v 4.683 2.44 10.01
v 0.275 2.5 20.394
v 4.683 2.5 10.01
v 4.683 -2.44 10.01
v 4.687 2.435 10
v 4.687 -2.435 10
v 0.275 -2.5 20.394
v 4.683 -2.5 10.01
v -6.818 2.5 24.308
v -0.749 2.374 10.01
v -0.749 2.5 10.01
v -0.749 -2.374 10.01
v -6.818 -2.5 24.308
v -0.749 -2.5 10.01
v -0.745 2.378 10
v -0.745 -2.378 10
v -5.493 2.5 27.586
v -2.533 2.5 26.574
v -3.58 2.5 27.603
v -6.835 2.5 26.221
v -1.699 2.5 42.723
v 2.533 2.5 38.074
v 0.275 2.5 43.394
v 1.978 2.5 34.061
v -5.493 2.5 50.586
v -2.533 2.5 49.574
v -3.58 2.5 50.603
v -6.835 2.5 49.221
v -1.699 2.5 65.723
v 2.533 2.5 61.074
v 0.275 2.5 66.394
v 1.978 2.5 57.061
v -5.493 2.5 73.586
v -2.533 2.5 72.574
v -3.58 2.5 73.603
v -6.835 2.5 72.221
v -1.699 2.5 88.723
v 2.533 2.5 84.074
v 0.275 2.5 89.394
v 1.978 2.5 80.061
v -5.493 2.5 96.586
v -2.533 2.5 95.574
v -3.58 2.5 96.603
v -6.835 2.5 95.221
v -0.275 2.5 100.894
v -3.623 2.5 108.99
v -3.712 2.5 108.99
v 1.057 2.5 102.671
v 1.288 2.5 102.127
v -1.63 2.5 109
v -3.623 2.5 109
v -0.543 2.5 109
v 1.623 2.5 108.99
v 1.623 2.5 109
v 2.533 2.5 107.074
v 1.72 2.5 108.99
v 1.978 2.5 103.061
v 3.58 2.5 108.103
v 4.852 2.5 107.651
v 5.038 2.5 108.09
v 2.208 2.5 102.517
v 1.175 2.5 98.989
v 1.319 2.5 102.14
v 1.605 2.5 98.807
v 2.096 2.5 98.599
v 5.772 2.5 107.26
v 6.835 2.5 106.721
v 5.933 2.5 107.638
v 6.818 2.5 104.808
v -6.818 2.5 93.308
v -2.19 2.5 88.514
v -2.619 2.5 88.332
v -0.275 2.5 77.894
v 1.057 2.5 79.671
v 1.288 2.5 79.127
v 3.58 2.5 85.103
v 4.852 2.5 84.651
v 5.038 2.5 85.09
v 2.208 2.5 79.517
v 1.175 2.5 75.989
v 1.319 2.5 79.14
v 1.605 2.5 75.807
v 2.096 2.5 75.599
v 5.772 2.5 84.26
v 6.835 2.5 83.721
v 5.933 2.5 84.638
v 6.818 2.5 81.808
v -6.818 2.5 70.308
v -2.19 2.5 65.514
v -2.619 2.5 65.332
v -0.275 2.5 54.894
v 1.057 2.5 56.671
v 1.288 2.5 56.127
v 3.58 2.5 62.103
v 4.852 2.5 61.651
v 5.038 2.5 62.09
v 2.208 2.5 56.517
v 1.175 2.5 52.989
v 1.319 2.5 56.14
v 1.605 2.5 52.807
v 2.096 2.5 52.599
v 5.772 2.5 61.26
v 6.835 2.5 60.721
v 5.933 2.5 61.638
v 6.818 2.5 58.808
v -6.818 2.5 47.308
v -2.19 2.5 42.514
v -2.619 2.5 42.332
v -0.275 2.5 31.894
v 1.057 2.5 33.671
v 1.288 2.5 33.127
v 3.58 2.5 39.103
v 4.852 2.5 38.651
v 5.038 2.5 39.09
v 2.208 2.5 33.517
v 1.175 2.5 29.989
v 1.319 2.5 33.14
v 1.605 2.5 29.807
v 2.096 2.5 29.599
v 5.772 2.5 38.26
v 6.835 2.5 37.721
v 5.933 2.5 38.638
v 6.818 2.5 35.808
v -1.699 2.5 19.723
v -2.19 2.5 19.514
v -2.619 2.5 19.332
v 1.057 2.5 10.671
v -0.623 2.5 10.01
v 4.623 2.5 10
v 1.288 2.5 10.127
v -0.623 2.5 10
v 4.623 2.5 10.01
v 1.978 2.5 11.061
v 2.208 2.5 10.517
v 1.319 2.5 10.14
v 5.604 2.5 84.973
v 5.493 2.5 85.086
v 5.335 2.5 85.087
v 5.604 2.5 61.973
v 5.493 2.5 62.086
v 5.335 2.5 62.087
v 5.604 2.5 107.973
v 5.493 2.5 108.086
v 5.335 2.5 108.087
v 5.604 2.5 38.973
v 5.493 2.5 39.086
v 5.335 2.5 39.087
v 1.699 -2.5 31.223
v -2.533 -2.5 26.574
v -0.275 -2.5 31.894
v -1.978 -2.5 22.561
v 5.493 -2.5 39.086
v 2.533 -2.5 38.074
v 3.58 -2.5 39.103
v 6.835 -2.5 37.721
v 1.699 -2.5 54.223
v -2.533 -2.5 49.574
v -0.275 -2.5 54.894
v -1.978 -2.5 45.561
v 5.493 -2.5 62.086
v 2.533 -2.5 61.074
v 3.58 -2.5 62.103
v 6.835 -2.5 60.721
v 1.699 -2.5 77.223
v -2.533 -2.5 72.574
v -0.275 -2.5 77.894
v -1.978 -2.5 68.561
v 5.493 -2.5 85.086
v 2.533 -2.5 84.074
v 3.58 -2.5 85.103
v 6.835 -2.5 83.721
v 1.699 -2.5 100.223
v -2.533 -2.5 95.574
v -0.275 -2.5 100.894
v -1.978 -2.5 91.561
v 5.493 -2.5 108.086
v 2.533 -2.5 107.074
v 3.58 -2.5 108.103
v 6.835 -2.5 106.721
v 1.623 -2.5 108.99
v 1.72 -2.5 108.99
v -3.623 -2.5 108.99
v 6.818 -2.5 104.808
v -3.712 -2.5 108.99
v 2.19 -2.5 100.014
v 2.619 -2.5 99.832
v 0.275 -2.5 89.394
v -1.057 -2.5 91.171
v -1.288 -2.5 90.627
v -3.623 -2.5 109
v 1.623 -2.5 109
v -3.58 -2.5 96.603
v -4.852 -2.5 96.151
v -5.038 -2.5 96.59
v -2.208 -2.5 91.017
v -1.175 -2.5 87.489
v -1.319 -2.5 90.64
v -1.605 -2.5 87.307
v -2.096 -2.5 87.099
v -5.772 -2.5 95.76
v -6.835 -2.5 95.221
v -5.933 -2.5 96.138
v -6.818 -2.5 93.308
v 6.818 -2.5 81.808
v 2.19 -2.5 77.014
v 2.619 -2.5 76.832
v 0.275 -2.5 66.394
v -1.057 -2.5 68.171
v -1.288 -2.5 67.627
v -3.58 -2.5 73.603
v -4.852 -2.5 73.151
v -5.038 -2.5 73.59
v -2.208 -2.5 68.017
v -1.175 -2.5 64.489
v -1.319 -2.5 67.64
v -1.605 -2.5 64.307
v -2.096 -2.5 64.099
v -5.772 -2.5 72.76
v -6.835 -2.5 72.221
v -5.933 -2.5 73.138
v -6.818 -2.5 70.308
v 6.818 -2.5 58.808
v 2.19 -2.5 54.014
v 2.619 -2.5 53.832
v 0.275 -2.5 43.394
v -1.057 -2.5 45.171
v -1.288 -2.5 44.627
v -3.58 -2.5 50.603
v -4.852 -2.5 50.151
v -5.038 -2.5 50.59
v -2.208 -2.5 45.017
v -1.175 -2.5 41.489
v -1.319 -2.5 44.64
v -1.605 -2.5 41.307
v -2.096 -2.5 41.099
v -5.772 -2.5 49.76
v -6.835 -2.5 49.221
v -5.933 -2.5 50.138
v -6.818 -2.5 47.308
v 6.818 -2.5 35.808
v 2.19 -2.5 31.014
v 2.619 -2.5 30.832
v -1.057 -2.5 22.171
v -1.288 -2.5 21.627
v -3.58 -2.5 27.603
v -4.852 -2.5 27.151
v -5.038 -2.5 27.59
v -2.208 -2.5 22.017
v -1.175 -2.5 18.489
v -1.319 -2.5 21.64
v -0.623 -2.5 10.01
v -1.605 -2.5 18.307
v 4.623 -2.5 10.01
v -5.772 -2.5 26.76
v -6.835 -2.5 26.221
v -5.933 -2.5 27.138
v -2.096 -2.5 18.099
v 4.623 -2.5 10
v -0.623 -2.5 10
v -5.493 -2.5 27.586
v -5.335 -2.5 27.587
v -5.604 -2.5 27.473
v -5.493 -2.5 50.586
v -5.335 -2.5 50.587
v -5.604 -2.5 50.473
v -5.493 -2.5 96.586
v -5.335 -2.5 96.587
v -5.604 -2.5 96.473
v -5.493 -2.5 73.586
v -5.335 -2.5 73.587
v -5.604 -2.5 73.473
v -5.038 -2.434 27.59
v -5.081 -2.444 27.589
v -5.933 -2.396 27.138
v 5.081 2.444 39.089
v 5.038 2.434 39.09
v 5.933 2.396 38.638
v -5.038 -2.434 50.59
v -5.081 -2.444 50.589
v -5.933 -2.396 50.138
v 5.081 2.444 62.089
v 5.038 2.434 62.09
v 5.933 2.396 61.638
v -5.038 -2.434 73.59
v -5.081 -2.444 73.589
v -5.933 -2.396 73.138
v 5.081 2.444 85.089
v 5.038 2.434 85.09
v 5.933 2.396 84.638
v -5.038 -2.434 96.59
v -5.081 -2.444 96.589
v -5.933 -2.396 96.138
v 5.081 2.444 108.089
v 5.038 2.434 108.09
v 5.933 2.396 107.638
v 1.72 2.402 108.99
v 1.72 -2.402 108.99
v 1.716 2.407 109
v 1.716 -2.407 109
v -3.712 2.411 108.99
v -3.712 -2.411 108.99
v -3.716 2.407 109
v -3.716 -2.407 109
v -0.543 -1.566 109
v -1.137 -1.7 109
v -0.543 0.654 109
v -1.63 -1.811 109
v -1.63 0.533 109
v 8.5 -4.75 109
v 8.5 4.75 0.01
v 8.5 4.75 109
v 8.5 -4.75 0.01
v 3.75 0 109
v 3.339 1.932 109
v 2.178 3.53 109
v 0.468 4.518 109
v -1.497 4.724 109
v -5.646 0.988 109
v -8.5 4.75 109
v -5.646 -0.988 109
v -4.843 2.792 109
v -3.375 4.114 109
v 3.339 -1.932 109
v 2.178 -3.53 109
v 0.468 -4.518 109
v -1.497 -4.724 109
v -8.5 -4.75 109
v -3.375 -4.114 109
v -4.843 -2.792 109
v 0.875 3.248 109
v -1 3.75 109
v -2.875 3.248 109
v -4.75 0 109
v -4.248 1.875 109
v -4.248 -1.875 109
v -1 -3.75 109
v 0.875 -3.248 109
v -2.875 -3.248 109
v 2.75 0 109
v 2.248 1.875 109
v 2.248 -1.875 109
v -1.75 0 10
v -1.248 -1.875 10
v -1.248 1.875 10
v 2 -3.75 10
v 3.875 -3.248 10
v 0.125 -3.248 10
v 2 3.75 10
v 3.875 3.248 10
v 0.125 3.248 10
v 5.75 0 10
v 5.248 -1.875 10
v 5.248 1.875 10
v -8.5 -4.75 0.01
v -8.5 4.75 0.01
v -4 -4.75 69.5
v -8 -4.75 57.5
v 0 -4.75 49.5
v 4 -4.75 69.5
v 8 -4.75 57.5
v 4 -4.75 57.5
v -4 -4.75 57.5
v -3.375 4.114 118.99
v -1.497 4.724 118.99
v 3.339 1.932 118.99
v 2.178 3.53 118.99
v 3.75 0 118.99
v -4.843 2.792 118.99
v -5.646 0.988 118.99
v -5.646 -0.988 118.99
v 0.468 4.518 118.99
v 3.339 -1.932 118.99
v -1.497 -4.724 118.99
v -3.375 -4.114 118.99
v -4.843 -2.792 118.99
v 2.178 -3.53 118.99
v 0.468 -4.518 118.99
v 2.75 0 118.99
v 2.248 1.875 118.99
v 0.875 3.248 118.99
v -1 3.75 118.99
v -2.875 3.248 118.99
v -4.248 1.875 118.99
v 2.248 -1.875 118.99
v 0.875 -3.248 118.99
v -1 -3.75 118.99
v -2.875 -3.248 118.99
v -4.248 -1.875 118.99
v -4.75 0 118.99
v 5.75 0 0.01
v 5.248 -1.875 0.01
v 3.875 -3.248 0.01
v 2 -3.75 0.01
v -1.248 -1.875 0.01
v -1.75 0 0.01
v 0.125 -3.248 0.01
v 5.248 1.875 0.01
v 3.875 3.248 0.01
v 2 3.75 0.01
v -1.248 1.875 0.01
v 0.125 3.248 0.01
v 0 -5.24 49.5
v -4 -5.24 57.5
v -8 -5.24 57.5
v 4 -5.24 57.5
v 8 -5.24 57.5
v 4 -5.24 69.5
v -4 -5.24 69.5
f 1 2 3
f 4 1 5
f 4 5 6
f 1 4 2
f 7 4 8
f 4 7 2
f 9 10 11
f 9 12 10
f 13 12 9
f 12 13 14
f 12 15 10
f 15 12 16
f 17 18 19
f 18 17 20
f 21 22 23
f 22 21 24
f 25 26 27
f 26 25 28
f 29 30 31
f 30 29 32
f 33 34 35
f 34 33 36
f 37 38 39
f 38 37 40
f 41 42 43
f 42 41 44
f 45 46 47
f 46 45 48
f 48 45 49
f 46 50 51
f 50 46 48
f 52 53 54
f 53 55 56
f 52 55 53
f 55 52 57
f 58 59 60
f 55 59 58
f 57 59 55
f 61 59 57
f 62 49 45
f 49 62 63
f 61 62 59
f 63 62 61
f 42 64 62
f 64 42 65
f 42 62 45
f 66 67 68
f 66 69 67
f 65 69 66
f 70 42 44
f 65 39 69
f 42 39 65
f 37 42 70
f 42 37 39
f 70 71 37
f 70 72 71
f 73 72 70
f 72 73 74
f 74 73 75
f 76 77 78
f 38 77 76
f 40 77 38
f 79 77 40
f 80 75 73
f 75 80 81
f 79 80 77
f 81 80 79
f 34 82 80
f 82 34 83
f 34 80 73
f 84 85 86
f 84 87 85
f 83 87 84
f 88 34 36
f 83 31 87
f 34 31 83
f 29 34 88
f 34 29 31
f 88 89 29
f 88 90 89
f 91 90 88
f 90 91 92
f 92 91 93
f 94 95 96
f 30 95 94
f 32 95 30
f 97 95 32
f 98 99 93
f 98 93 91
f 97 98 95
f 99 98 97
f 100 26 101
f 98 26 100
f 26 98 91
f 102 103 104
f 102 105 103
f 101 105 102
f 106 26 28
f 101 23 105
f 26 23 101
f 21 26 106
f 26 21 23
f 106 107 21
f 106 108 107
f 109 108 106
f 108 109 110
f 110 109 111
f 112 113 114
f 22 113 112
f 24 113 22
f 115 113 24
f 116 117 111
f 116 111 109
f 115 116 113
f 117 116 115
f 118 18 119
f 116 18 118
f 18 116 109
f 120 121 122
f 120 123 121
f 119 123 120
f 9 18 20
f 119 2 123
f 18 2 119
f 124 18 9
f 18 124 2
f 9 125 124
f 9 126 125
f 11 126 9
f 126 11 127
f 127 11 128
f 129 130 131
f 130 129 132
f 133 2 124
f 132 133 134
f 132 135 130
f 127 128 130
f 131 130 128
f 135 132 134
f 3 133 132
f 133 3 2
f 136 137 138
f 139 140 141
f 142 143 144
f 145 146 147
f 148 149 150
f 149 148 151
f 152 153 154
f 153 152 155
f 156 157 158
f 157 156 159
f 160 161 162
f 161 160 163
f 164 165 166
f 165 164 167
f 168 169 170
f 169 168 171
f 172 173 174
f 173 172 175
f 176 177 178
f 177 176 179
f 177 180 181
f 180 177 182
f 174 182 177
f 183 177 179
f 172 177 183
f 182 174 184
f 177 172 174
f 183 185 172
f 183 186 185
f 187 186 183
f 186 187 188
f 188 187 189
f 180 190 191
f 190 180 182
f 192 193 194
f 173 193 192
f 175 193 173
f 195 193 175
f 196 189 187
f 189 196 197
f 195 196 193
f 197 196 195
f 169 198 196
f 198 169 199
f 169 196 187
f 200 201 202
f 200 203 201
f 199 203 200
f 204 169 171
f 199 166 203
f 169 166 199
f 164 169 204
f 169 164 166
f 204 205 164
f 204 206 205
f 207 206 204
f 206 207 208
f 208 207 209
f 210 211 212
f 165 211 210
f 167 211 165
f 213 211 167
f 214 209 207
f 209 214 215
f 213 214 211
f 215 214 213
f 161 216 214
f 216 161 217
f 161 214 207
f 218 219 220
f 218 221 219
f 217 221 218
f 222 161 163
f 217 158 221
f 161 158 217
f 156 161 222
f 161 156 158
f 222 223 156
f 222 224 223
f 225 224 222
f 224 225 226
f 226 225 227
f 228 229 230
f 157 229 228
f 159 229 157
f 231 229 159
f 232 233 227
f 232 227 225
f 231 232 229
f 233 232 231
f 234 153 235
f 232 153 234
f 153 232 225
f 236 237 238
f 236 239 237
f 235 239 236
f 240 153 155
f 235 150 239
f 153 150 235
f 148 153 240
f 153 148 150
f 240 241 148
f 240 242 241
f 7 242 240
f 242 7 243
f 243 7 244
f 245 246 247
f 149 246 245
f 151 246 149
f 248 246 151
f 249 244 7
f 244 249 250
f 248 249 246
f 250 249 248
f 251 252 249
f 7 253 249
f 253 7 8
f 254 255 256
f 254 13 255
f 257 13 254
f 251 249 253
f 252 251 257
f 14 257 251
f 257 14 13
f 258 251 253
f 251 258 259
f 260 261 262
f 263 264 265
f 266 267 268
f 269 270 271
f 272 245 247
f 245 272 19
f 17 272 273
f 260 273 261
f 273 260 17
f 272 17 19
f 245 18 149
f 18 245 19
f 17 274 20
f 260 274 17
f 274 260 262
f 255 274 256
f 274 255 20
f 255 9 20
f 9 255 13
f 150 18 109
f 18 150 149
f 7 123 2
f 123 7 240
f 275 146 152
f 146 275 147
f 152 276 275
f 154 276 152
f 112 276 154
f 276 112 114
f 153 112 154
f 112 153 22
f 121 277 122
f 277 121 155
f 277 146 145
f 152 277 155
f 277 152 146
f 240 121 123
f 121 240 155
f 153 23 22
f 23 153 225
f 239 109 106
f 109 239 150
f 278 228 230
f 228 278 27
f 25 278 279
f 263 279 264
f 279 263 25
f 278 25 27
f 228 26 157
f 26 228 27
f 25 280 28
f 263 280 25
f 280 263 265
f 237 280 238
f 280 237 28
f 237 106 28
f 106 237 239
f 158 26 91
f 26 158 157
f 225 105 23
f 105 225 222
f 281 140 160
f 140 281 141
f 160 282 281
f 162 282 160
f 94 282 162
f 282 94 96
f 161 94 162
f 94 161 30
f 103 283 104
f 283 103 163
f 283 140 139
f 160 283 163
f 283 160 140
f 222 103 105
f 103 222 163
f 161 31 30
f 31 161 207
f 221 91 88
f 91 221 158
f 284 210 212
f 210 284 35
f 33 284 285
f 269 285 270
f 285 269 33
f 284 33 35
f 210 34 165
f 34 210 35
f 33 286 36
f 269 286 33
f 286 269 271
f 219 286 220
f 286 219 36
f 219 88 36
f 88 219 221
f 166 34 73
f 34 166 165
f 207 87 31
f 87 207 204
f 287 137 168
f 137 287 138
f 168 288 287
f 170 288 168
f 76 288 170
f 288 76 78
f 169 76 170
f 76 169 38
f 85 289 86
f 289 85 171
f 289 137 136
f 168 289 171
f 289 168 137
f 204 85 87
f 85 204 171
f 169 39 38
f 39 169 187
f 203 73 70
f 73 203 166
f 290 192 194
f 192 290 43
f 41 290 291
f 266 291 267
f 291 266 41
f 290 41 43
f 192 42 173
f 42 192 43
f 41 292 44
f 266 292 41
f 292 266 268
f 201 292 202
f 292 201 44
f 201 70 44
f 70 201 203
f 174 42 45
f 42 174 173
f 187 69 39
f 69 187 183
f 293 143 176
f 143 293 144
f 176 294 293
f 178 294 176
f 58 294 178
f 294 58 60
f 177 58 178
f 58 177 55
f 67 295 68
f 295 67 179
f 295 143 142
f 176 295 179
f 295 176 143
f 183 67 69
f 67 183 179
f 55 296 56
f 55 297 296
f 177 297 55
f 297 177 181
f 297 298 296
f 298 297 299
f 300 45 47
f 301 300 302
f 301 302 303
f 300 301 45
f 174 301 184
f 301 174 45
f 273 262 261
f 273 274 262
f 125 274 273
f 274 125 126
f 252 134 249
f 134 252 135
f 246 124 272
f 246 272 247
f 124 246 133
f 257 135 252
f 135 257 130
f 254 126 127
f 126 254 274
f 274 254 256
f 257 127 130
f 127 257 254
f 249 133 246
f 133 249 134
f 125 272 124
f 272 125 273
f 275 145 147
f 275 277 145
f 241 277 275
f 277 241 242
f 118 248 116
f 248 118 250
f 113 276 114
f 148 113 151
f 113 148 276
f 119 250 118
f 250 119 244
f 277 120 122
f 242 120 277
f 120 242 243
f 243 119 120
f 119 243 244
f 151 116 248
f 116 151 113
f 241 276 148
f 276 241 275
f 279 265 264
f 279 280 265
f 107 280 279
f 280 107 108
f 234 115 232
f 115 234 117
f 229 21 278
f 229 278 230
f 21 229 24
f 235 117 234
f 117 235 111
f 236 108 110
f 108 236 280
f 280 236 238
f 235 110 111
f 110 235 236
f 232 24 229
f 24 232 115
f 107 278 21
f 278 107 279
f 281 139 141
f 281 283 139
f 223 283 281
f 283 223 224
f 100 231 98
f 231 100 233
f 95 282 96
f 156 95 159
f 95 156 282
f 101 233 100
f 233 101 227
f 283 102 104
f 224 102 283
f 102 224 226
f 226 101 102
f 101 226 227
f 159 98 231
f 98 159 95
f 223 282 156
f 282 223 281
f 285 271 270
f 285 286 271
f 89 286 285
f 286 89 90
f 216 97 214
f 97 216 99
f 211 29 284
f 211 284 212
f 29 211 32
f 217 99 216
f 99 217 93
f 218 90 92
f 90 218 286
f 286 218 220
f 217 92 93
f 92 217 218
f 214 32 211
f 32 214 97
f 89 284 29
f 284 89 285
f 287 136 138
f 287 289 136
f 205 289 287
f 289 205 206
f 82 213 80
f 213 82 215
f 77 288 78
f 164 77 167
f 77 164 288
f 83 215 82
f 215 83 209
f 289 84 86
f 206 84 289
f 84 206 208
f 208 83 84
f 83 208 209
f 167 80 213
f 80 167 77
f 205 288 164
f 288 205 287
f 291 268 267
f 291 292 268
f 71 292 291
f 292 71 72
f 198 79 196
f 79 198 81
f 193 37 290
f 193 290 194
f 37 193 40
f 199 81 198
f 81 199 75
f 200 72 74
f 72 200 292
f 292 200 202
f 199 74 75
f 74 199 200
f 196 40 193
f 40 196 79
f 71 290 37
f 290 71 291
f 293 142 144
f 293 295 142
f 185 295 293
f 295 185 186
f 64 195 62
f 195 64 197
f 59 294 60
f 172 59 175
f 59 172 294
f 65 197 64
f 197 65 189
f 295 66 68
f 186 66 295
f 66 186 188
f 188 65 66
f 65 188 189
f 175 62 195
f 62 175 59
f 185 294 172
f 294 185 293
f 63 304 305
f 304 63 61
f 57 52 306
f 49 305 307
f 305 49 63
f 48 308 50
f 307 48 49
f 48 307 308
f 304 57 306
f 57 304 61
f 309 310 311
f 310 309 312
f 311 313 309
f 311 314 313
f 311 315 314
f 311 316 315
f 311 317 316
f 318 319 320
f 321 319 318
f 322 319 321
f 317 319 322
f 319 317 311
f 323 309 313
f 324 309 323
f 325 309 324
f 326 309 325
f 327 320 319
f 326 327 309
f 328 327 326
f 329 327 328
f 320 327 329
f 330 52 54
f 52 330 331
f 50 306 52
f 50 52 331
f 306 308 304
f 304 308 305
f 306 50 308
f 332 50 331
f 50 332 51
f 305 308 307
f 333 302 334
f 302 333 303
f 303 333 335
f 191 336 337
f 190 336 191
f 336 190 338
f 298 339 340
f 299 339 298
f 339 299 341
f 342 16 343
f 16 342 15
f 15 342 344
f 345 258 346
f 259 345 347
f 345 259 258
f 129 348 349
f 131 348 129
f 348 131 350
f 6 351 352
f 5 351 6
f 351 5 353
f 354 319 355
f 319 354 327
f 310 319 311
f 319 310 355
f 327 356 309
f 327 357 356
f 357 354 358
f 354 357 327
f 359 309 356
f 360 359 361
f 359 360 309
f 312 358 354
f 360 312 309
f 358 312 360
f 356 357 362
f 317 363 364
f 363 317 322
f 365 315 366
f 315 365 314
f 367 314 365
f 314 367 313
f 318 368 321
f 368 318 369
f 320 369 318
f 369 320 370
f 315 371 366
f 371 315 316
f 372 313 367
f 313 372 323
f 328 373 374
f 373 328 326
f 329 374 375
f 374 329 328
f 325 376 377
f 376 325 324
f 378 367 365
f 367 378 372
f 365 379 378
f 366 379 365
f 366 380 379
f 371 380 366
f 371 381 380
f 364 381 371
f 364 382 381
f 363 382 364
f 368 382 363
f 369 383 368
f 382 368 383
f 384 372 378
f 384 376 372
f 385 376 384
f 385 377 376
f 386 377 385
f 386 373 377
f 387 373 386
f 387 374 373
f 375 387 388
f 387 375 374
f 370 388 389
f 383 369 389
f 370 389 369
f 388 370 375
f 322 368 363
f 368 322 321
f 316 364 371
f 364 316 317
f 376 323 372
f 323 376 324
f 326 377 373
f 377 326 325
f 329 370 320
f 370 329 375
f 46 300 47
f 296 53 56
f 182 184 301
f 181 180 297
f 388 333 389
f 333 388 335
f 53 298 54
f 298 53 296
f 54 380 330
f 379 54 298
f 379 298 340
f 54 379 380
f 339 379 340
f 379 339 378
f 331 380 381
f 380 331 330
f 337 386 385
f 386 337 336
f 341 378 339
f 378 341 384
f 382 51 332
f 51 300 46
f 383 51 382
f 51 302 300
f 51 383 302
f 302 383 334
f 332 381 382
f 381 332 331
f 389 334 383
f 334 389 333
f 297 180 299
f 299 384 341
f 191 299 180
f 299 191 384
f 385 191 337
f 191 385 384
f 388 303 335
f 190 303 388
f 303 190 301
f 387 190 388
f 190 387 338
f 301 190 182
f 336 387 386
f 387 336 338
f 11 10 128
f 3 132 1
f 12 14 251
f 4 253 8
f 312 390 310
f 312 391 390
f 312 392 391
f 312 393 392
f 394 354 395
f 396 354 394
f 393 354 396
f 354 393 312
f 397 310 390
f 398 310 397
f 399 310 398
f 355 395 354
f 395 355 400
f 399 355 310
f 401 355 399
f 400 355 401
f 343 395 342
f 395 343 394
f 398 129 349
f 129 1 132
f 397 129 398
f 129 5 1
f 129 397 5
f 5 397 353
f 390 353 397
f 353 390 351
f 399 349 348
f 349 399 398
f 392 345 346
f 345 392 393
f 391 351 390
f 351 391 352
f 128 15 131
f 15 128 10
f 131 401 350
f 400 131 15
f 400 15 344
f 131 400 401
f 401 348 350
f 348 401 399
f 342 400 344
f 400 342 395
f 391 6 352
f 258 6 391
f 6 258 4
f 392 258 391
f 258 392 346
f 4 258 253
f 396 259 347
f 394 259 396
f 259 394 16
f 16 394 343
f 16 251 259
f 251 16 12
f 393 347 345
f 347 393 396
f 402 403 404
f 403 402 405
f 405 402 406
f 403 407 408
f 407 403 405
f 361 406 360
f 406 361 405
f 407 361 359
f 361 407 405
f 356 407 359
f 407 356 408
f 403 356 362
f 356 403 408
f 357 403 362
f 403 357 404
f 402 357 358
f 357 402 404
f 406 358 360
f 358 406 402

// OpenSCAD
showCutaway=false;

//[hidden]
small=0.01;

module valve_left()
{
        translate([-1,0,0]) 
        rotate([0,-23,0]) 
        union() {
            cube([5,5,18],center=true); 
            
            translate([0,0,9]) 
            rotate([90,0,0]) 
            translate([0,0,-2.5]) 
            cylinder(5,2.5,2.5); 
        }

}
//!valve_left();

module stem_left()
{
    rotate([0,-23,0])
    translate([-1,0,2.5]) 
    rotate([30,0,0]) 
    cube([1,5,20],center=true);    
}
module valve_right()
{
    rotate([0,0,180])
    valve_left();
}

module stem_right()
{
    rotate([0,0,180])
    stem_left();    
}

module cutout(cnt)
{
    difference()
    {
        union()
        {
            for (i=[0:2:cnt]) 
            {
                translate([0,0,11.5*i])
                valve_left();
                
                translate([0,0,11.5*(i+1)])
                valve_right();
                
            }
        }
        
        union()
        {
            for (i=[0:2:cnt]) 
            {
                translate([0,0,11.5*i])
                stem_left();
                
                translate([0,0,11.5*(i+1)])
                stem_right();
                
            }
        }    
    }
}
//!cutout(2);

module arrow()
{
    linear_extrude(height=1)
    polygon([[0,0],[8,8],[4,8],[4,20],[0,20],[-4,20],[-4,8],[-8,8]]);
}
//!arrow();
module chain()
{
    h=99;
    //scale(1.3)
    translate([0,0,10])
    union()
    {
 
        difference() 
        {
            translate([0,0,h/2]) 
            cube([17,9.5,h],center=true);     
            
            translate([0,0,7])
            cutout(8);
        }
        
        // an arrow to show directionality
        translate([0,-4.25+small,h/2-20/2])
        rotate([90,0,0])
        arrow();
        
        // a nozzle on the top
        translate([-1,0,h-small])
        difference()
        {
            cylinder(d=9.5, h=10);
            translate([0,0,-small])
            cylinder(d=7.5, h=10+2*small);
        }
        
        // straight tube on bottom in a square shape 
        difference()
        {
            translate([0,0,-5+small])
            cube([17,9.5,10],center=true);
            
            translate([2,0,-10-small])
            cylinder(d=7.5, h=10+3*small);
        }
    }

}
if (showCutaway)
{
    difference()
    {
        chain();
        translate([-15,0,-small])cube([30,30,400]);
    }
} else
{
    chain();
}
